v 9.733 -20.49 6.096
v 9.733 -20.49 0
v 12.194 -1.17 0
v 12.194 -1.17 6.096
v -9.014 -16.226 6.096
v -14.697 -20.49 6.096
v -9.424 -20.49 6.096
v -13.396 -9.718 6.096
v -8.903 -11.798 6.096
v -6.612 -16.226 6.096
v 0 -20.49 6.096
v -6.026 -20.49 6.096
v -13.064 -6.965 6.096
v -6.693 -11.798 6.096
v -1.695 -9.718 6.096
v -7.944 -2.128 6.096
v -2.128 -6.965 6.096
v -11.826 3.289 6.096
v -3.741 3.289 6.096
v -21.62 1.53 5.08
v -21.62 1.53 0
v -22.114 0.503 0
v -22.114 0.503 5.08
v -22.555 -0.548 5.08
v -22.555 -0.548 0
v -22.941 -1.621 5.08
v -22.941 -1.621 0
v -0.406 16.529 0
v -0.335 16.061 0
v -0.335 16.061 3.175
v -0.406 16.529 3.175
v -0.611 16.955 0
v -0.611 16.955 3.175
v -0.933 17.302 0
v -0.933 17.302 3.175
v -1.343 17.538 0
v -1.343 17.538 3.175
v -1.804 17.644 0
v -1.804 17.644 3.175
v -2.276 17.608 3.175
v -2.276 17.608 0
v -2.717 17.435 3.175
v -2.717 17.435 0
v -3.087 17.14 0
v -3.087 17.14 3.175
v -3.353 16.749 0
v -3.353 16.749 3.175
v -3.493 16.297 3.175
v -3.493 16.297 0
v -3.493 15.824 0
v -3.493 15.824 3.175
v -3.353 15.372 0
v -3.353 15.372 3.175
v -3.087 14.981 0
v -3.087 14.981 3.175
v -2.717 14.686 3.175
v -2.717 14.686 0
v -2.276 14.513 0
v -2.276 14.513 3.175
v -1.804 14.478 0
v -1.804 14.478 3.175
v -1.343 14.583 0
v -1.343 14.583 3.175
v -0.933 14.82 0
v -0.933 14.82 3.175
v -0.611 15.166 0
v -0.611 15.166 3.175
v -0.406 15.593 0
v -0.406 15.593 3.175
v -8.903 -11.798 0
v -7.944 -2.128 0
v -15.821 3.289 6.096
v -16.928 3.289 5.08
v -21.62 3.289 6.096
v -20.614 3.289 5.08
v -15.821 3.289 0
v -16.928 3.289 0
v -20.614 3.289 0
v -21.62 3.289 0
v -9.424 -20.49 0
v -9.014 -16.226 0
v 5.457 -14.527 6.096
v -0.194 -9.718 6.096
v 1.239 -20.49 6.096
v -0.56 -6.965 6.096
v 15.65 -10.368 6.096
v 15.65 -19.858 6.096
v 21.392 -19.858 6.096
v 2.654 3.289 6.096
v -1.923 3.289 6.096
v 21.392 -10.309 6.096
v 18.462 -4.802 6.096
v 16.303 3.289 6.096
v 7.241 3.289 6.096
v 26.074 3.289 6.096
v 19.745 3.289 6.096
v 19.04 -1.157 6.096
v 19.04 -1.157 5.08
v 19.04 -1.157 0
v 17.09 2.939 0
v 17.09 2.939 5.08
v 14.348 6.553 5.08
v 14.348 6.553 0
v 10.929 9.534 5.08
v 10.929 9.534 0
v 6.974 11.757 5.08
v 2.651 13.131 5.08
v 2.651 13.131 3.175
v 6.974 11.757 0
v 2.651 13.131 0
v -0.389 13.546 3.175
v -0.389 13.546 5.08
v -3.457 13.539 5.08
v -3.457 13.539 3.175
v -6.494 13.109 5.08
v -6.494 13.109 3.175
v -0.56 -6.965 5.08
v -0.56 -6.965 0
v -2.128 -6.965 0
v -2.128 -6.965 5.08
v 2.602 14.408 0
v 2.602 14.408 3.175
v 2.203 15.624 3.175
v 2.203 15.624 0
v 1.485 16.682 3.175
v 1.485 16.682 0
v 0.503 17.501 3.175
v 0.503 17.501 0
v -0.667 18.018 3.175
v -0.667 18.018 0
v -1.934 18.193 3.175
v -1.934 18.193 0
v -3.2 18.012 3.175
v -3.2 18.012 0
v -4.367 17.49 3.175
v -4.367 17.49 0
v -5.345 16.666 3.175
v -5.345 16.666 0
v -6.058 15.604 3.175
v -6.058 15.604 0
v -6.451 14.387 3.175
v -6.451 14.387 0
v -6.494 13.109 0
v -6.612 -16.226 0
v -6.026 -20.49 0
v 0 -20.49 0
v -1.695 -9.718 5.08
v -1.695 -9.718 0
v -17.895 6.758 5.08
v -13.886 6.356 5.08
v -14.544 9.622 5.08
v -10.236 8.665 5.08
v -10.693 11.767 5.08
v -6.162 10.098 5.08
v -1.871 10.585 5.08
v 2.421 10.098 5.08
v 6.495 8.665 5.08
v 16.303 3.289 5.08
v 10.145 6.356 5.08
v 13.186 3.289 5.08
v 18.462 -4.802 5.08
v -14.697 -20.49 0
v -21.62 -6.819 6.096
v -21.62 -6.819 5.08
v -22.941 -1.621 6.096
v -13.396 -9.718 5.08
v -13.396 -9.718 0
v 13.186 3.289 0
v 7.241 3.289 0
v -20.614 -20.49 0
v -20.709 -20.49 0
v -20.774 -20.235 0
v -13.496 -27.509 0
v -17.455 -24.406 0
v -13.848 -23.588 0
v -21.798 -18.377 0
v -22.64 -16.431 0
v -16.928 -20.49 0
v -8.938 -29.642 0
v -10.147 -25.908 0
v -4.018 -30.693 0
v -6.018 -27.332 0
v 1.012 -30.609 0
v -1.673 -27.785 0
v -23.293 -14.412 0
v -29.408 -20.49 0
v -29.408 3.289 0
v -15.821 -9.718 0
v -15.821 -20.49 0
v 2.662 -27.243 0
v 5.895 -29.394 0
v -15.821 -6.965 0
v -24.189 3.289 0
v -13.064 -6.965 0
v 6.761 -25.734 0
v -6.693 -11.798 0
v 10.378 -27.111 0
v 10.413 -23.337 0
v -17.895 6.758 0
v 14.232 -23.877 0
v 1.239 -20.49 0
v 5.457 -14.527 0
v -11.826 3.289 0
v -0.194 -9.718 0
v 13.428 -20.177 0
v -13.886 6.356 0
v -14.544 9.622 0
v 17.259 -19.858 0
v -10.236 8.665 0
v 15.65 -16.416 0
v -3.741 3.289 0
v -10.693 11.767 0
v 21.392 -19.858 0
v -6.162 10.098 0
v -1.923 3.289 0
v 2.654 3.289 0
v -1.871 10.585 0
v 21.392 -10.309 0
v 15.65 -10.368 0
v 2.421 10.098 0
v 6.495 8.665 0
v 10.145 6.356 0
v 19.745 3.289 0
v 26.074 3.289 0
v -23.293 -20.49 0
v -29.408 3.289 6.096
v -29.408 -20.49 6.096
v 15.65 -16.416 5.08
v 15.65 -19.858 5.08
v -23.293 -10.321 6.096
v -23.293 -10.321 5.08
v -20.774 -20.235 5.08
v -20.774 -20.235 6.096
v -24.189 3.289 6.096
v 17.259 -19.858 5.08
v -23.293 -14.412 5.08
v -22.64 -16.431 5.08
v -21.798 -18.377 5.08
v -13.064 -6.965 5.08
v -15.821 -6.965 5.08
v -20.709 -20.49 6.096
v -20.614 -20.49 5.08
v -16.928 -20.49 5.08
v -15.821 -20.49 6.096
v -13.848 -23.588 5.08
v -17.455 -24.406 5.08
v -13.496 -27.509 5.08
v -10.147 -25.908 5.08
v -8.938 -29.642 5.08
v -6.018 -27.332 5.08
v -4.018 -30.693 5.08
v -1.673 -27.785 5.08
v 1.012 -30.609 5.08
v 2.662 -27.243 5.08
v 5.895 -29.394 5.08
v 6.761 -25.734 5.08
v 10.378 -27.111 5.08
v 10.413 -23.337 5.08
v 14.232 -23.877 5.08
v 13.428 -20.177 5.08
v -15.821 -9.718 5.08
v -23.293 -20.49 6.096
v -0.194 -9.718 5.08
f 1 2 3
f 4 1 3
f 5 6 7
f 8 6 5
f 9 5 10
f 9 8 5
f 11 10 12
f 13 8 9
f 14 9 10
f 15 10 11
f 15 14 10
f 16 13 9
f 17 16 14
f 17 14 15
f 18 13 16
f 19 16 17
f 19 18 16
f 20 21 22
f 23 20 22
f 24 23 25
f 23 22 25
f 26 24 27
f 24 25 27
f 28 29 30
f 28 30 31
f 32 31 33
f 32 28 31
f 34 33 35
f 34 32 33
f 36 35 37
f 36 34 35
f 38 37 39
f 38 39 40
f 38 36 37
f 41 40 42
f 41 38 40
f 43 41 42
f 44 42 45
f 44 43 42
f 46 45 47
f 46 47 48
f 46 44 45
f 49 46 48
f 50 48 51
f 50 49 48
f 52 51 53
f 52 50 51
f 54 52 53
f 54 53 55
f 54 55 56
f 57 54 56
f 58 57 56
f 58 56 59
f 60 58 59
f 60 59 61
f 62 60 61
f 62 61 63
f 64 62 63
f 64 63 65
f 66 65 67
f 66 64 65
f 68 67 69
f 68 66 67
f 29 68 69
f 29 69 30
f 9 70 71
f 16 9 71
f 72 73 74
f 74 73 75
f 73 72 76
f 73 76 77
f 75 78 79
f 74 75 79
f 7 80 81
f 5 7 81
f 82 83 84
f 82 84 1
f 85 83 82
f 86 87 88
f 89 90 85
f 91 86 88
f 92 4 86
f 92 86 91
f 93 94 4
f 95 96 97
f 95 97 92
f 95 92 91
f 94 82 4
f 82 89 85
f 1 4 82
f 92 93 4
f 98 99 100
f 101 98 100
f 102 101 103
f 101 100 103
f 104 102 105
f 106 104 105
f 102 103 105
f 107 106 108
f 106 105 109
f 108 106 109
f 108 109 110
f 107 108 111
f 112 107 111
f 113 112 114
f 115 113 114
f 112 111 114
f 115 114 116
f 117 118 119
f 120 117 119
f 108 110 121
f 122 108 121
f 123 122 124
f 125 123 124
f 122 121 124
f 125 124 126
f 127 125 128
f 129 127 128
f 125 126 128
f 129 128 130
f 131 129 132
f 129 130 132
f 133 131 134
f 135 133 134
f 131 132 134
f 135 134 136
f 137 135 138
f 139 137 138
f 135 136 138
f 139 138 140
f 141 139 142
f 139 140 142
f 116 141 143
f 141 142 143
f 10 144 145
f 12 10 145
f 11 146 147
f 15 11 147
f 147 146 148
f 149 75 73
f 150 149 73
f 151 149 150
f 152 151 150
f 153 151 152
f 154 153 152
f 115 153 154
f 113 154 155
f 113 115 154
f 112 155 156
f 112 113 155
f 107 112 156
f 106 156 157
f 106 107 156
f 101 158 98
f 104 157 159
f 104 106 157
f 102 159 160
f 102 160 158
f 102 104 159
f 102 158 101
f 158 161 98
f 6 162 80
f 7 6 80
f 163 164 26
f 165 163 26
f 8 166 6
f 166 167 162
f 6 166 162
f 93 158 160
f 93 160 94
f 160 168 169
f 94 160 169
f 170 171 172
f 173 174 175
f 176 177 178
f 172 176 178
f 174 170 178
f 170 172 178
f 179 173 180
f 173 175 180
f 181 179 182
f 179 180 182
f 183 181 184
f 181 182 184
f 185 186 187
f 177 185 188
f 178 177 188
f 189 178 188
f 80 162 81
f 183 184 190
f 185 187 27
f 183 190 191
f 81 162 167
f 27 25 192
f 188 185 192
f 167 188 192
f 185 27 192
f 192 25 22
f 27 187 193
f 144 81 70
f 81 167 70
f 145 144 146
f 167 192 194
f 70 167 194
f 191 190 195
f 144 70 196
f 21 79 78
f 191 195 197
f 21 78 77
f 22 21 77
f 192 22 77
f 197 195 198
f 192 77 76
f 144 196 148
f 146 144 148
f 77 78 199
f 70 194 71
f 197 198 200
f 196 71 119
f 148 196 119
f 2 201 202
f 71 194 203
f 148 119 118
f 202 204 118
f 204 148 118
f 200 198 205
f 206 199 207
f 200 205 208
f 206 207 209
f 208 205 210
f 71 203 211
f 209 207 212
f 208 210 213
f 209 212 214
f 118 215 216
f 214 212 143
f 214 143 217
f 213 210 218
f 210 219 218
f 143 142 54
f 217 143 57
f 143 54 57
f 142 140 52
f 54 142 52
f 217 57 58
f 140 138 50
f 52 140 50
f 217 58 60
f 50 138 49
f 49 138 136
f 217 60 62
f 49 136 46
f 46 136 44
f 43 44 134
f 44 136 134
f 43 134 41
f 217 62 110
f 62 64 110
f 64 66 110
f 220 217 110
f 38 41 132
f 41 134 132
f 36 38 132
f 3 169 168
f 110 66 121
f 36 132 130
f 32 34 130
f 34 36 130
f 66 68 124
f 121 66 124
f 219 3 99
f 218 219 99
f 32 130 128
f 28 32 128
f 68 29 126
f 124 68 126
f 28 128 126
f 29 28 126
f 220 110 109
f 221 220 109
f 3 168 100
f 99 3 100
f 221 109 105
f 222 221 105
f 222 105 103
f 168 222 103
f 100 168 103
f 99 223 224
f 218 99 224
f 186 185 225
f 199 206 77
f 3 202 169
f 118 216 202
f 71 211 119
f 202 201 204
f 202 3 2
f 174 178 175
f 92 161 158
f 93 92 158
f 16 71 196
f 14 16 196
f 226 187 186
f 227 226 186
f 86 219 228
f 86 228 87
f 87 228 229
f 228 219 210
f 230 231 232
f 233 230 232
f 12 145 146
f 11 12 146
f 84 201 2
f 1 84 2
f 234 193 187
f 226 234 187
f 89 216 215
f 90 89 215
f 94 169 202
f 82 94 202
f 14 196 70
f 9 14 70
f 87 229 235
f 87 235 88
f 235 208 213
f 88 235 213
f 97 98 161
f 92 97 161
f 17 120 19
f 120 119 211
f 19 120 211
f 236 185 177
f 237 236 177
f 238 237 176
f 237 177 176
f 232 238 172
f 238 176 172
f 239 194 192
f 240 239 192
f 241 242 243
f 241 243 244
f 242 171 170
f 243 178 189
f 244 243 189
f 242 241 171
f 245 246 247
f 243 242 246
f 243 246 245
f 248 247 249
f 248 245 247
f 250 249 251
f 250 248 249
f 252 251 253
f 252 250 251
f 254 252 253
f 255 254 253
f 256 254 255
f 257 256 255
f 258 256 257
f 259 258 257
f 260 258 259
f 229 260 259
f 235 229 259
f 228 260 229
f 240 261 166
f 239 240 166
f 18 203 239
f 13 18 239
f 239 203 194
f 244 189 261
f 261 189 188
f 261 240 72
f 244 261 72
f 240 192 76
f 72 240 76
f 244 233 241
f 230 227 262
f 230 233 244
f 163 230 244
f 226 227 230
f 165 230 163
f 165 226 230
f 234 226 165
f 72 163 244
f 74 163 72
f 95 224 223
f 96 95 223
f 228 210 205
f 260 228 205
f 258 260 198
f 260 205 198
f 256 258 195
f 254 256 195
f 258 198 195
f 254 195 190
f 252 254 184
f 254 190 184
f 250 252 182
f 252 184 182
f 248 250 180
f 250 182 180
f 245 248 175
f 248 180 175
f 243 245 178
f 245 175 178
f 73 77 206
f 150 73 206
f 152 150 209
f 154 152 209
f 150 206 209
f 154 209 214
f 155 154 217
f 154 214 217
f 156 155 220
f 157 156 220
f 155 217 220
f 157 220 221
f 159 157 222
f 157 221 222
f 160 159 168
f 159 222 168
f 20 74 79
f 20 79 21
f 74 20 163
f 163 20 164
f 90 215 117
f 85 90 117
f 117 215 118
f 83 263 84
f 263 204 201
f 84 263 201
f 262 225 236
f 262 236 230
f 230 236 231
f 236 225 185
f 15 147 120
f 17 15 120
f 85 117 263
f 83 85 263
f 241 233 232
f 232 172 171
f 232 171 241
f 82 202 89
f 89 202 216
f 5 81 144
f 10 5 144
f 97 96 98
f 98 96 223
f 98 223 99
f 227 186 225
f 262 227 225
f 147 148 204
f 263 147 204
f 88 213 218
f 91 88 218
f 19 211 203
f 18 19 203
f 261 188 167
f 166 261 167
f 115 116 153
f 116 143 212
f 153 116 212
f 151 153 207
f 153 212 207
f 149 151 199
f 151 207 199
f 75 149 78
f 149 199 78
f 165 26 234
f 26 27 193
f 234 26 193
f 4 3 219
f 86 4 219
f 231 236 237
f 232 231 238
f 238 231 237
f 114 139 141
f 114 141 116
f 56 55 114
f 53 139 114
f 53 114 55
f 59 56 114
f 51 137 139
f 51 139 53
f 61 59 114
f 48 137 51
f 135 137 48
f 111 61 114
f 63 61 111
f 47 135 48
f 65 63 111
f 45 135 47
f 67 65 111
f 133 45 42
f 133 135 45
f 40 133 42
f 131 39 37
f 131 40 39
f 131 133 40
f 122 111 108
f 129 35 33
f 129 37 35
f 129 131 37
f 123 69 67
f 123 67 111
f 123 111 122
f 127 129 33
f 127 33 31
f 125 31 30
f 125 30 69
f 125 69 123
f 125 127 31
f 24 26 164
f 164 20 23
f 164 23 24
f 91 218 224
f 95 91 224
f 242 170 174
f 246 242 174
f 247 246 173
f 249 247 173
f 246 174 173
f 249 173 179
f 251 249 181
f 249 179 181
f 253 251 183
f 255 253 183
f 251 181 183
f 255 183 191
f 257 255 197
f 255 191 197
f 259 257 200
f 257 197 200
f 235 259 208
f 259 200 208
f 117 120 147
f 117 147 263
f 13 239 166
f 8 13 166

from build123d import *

# Parameters (mm, degrees)
F1_DEPTH = 6.096
F2_DEPTH = 5.08
F0_R     = 1.5875
F3_DEPTH = 3.175
F4_DEPTH = 5.08


# Not quite as in the source:
# - a feature names something its author has since deleted; it is built from what else it names


with BuildPart() as f1:
    # F0 (on Top) → F1 (new body)
    with BuildSketch(Plane.XY):
        Polygon((-24.1886169598, 3.2886979016), (-29.4082708062, 3.2886979016), (-29.4082708062, -20.4897223923), (-23.292648052, -20.4897223923), (-23.292648052, -14.4124455645), (-23.292648052, -10.3212194436), (-20.7735943805, -20.2349212979), (-20.7088498843, -20.4897223923), (-20.6143816365, -20.4897223923), (-16.92762383, -20.4897223923), (-15.8206042222, -20.4897223923), (-15.8206042222, -9.7183147231), (-15.8206042222, -6.9649312645), (-15.8206042222, 3.2886979016), (-16.92762383, 3.2886979016), (-20.6143816365, 3.2886979016), (-21.6202178109, 3.2886979016), (-21.6202178109, 1.5303949543), (-21.6202178109, -6.8192024151), (-22.9411163325, -1.6208240435), align=None)
    extrude(amount=F1_DEPTH)



with BuildPart() as f1b:
    # F0 (on Top) → F1, piece 2 (new body)
    with BuildSketch(Plane.XY):
        Polygon((-11.8259407802, 3.2886979016), (-13.0638151335, -6.9649312645), (-13.3962186866, -9.7183147231), (-14.6966021007, -20.4897223923), (-9.4239554059, -20.4897223923), (-9.0138624712, -16.2260920352), (-6.6118787134, -16.2260920352), (-6.0260297393, -20.4897223923), (0, -20.4897223923), (-1.6947368922, -9.7183147231), (-2.1279449434, -6.9649312645), (-3.7412163152, 3.2886979016), align=None)
        Polygon((-8.9032554867, -11.7976386267), (-7.9436938241, -2.1282115334), (-6.6930804921, -11.7976386267), align=None, mode=Mode.SUBTRACT)
    extrude(amount=F1_DEPTH)


with BuildPart() as f1c:
    # F0 (on Top) → F1, piece 3 (new body)
    with BuildSketch(Plane.XY):
        Polygon((16.3027588278, 3.2886979016), (13.1864075148, 3.2886979016), (7.2406129912, 3.2886979016), (5.4566214701, -14.5271265076), (2.6535398471, 3.2886979016), (-1.9227857701, 3.2886979016), (-0.5595875609, -6.9649312645), (-0.1935310809, -9.7183147231), (1.23850468, -20.4897223923), (9.7333230228, -20.4897223923), (12.1938914085, -1.1697572338), (15.6504033197, -10.3675947497), (15.6504033197, -16.4159582139), (15.6504033197, -19.8583583692), (17.259035404, -19.8583583692), (21.3917291938, -19.8583583692), (21.3917291938, -10.3090095828), (26.0736756027, 3.2886979016), (19.7453610599, 3.2886979016), (19.0404757801, -1.1567947134), (18.4624816288, -4.8020243761), align=None)
    extrude(amount=F1_DEPTH)


with BuildPart() as f1_1:
    add(f1.part)

    add(f1c.part)  # F2 merges F1c
    # F0 (on Top) → F2 (join)
    with BuildSketch(Plane.XY):
        with BuildLine():
            ThreePointArc((-6.4941192245, 13.1090595505), (-14.544099093, 9.6221382111), (-20.6143816365, 3.2886979016))
            Line((-20.6143816365, 3.2886979016), (-16.92762383, 3.2886979016))
            ThreePointArc((-16.92762383, 3.2886979016), (-1.8706081576, 10.5845610899), (13.1864075148, 3.2886979016))
            Line((13.1864075148, 3.2886979016), (16.3027588278, 3.2886979016))
            Line((16.3027588278, 3.2886979016), (18.4624816288, -4.8020243761))
            Line((18.4624816288, -4.8020243761), (19.0404757801, -1.1567947134))
            ThreePointArc((19.0404757801, -1.1567947134), (12.7148241923, 8.1311202307), (2.6507858926, 13.130556711))
            ThreePointArc((2.6507858926, 13.130556711), (-1.9227857701, 13.595875741), (-6.4941192245, 13.1090595505))
        make_face()
        with BuildLine():
            ThreePointArc((-21.6202178109, 1.5303949543), (-22.3413934423, -0.0197598322), (-22.9411163325, -1.6208240435))
            Line((-22.9411163325, -1.6208240435), (-21.6202178109, -6.8192024151))
            Line((-21.6202178109, -6.8192024151), (-21.6202178109, 1.5303949543))
        make_face()
        with BuildLine():
            Line((-23.292648052, -10.3212194436), (-23.292648052, -14.4124455645))
            ThreePointArc((-23.292648052, -14.4124455645), (-22.2422118931, -17.4141450598), (-20.7735943805, -20.2349212979))
            Line((-20.7735943805, -20.2349212979), (-23.292648052, -10.3212194436))
        make_face()
        with BuildLine():
            Line((-16.92762383, -20.4897223923), (-20.6143816365, -20.4897223923))
            ThreePointArc((-20.6143816365, -20.4897223923), (-1.5006364525, -30.7938779901), (17.259035404, -19.8583583692))
            Line((17.259035404, -19.8583583692), (15.6504033197, -19.8583583692))
            Line((15.6504033197, -19.8583583692), (15.6504033197, -16.4159582139))
            ThreePointArc((15.6504033197, -16.4159582139), (0.5098765571, -27.6373274044), (-16.92762383, -20.4897223923))
        make_face()
    extrude(amount=F2_DEPTH)

    # F0 (on Top) → F3 (join)
    with BuildSketch(Plane.XY):
        with BuildLine():
            ThreePointArc((2.6507858926, 13.130556711), (-1.933592452, 18.1930447362), (-6.4941192245, 13.1090595505))
            ThreePointArc((-6.4941192245, 13.1090595505), (-1.9227857701, 13.595875741), (2.6507858926, 13.130556711))
        make_face()
        with Locations((-1.9227857701, 16.0606782883)):
            Circle(F0_R, mode=Mode.SUBTRACT)
    extrude(amount=F3_DEPTH)


    add(f1b.part)  # F4 merges F1b
    # F0 (on Top) → F4 (join)
    with BuildSketch(Plane.XY):
        Polygon((-13.0638151335, -6.9649312645), (-15.8206042222, -6.9649312645), (-15.8206042222, -9.7183147231), (-13.3962186866, -9.7183147231), align=None)
        Polygon((-0.5595875609, -6.9649312645), (-2.1279449434, -6.9649312645), (-1.6947368922, -9.7183147231), (-0.1935310809, -9.7183147231), align=None)
    extrude(amount=F4_DEPTH)


solid = f1_1.part
